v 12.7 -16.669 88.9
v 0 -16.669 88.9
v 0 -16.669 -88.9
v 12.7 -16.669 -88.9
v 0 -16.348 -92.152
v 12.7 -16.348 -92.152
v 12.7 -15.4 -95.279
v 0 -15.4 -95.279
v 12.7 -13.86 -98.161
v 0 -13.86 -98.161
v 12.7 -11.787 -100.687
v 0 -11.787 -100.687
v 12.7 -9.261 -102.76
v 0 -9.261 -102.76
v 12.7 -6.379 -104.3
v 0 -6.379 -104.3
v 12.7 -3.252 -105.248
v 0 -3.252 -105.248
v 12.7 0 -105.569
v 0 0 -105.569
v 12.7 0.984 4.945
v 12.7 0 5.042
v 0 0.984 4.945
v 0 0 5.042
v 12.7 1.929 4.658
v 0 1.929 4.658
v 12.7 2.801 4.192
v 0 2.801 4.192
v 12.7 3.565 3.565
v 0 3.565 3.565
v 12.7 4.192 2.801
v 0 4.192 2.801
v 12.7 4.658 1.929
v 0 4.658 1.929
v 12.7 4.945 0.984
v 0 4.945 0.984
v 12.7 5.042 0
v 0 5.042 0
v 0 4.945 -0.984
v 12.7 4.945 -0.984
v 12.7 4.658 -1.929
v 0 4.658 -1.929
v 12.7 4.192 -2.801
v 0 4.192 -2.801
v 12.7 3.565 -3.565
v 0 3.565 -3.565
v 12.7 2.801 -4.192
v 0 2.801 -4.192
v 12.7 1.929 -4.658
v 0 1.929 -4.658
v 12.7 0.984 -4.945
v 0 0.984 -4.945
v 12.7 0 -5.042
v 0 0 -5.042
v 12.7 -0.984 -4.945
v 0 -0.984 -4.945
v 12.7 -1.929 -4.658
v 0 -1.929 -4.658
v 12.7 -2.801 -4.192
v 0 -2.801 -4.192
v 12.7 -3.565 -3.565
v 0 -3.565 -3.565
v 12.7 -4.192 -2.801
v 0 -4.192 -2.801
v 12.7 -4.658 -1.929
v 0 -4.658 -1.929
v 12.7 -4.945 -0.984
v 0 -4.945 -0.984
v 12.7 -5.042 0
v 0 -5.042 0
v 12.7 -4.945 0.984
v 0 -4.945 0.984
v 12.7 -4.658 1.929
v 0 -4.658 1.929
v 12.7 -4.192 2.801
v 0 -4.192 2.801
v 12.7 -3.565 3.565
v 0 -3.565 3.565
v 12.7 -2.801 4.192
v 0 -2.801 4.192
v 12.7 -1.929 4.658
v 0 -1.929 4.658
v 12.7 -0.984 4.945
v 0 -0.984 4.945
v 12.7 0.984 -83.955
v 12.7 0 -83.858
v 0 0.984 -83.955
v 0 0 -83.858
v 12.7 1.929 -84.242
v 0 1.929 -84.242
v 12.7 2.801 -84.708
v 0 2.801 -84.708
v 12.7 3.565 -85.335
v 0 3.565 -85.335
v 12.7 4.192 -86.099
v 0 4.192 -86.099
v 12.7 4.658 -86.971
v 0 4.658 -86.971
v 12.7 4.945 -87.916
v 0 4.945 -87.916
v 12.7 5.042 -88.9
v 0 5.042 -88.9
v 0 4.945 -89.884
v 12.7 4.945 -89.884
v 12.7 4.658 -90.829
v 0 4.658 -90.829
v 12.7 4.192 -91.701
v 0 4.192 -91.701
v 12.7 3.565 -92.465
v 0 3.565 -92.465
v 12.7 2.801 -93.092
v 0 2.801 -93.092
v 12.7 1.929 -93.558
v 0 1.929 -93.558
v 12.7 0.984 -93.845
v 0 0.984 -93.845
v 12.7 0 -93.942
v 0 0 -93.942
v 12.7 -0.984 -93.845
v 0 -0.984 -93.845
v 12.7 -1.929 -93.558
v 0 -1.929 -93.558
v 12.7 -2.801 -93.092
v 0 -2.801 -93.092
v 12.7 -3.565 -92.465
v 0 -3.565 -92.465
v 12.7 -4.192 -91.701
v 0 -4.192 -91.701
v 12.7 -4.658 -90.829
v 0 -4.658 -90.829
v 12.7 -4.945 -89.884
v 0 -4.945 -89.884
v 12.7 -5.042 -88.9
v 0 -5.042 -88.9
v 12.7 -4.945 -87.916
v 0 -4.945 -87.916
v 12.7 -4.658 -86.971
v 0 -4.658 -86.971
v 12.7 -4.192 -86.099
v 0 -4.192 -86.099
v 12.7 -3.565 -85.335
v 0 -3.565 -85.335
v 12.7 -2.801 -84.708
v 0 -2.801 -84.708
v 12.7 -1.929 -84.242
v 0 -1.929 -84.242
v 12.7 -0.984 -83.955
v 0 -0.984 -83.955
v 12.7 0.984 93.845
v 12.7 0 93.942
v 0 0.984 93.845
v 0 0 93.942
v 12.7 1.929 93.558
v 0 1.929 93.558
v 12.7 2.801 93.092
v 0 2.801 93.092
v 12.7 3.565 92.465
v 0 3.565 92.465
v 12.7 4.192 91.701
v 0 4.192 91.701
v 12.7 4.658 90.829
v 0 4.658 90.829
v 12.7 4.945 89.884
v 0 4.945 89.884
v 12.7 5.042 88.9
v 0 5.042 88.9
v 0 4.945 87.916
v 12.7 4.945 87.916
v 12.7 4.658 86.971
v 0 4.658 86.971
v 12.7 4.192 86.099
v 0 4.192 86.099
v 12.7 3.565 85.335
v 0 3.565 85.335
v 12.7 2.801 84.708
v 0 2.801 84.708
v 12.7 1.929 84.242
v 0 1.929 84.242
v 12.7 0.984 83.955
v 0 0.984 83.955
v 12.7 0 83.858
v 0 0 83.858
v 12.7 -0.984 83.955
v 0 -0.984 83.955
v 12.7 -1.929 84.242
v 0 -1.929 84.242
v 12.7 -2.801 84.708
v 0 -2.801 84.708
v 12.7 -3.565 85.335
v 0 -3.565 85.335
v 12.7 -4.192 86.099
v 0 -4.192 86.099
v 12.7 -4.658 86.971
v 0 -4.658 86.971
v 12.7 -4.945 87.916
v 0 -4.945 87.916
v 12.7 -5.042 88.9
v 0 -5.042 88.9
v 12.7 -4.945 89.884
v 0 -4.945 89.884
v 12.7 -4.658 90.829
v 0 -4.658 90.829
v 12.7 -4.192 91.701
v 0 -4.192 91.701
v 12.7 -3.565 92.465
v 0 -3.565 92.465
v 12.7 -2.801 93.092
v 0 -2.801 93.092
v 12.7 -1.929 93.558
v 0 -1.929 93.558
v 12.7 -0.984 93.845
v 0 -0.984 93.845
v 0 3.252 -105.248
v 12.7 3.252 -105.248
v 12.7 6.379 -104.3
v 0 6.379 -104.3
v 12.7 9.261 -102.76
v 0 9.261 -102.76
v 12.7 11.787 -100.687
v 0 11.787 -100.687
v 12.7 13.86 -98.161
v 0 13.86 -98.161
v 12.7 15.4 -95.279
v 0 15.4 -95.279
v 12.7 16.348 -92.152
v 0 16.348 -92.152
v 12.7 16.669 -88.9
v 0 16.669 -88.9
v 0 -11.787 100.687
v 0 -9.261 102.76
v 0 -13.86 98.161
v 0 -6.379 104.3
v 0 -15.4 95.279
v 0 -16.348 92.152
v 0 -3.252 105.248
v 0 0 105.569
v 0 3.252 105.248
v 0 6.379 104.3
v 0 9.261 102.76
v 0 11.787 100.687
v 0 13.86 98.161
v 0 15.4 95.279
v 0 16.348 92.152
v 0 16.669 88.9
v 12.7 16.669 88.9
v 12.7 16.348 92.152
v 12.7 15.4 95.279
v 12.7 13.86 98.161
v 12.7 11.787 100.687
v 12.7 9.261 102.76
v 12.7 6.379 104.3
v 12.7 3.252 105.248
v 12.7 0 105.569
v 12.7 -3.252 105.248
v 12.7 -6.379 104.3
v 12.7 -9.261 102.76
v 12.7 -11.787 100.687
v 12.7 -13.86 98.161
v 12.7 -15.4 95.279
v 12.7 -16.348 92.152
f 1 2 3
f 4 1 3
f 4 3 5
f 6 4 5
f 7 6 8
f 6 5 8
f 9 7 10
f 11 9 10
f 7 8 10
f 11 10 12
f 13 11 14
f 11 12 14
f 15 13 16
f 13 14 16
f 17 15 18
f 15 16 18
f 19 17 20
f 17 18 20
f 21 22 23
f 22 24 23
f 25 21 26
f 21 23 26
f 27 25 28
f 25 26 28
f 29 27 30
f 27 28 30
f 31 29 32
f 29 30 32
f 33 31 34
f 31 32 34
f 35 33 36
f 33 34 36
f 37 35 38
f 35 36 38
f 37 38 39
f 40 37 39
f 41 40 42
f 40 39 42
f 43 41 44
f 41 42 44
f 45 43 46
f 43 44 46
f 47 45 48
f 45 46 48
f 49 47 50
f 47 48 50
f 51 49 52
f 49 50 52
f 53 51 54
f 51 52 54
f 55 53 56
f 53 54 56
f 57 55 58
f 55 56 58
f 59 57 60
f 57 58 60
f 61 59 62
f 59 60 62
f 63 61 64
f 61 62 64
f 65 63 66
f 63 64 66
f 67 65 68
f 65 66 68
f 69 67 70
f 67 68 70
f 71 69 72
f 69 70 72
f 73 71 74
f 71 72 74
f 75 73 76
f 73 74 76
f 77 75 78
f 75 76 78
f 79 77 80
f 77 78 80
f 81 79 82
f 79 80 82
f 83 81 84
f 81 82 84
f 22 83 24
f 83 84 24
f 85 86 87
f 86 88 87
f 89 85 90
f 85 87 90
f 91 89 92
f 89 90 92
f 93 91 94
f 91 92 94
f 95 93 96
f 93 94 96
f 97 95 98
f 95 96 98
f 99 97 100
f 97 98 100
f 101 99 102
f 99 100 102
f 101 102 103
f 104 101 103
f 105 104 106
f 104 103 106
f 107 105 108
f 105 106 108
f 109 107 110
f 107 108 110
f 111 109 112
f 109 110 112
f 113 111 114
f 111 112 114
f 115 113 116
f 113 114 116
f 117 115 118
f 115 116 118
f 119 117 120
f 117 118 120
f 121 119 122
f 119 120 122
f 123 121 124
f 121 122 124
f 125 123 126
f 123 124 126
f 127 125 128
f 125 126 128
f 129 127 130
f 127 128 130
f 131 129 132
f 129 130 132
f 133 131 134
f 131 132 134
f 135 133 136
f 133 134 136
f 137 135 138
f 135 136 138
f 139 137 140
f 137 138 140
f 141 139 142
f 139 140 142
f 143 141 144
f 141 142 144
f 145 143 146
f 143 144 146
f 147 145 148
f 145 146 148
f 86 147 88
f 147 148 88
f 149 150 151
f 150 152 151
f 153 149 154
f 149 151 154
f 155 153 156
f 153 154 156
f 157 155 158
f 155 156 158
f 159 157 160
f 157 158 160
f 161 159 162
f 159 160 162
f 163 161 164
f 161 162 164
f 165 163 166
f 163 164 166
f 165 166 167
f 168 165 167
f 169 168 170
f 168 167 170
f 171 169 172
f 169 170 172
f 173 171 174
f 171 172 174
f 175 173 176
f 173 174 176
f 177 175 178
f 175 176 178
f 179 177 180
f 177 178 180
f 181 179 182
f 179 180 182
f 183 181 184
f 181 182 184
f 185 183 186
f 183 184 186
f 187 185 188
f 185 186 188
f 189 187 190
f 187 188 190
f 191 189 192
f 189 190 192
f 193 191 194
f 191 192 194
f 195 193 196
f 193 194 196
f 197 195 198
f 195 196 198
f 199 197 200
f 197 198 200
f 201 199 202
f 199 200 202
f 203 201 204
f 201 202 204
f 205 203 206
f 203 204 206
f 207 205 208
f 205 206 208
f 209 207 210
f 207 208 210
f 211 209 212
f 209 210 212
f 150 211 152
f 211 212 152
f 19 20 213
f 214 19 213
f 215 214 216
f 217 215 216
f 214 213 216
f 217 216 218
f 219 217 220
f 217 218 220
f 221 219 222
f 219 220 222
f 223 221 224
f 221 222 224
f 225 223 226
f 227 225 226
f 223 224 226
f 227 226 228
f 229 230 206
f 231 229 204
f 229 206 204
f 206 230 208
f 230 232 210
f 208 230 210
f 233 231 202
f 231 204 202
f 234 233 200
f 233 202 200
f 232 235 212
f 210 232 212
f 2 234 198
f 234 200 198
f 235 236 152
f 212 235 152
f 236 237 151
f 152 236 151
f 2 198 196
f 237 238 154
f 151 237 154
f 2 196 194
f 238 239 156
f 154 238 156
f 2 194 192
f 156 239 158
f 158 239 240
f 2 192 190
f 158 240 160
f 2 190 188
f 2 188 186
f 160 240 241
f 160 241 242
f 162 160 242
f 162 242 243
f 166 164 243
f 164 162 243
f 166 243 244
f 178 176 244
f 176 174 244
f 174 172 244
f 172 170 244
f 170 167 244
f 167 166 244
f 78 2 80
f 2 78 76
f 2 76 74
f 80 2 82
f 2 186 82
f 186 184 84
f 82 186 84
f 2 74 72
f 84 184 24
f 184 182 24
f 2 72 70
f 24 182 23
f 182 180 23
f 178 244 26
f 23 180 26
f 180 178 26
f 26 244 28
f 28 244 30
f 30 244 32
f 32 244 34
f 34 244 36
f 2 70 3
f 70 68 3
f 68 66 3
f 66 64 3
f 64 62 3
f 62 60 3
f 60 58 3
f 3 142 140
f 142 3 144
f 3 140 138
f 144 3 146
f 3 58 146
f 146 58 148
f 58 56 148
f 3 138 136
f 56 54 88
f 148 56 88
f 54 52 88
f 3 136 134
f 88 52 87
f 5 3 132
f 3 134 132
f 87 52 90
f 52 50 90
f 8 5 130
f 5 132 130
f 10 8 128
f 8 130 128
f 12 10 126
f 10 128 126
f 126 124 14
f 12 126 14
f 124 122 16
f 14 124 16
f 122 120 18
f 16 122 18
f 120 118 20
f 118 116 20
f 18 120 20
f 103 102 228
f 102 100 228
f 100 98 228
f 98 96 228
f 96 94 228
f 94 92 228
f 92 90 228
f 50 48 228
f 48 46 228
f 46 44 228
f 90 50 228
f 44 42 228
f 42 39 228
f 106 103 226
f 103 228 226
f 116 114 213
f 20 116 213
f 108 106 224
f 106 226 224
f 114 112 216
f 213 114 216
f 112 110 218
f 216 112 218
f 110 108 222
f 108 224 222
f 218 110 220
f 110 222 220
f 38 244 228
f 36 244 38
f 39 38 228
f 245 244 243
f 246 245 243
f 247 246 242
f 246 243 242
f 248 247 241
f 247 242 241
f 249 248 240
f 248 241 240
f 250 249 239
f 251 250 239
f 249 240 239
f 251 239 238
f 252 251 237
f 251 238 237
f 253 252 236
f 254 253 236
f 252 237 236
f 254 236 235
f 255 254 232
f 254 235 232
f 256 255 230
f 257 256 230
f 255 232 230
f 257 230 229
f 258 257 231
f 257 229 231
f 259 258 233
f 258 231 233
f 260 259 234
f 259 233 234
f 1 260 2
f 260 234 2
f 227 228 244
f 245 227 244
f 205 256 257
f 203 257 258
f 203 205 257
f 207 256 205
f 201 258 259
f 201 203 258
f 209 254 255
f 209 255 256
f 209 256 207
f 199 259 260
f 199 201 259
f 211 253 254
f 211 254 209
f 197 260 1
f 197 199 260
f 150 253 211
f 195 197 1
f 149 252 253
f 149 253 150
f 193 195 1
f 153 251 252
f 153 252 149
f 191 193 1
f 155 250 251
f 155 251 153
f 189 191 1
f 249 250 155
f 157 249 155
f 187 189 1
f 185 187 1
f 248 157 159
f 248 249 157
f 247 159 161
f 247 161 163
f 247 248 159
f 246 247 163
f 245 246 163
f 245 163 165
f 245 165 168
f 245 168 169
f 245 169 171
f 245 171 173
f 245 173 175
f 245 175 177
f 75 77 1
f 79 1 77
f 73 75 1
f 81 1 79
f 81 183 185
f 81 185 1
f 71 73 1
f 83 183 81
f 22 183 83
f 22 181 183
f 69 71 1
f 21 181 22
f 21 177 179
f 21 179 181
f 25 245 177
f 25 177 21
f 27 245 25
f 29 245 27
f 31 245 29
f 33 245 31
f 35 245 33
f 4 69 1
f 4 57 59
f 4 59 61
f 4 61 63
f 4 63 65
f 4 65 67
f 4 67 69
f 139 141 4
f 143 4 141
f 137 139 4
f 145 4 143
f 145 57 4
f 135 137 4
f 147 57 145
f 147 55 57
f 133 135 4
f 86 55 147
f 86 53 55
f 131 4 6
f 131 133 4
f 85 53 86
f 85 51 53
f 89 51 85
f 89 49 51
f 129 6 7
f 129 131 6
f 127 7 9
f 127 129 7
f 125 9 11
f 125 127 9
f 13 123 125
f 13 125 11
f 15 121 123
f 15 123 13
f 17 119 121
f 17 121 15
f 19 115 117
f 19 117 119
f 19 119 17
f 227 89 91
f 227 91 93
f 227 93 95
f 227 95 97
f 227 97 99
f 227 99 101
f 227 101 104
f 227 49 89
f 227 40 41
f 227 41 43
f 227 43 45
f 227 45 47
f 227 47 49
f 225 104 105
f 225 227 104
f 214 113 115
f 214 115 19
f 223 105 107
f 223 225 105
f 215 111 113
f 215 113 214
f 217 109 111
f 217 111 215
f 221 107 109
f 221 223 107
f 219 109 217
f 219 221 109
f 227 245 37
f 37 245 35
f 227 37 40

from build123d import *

# Parameters (mm, degrees)
SKETCH1_R                   = 16.66875
BOSS_EXTRUDE1_DEPTH         = 12.7
F_3_8_CLEARANCE_HOLE1_D     = 10.0838
F_3_8_CLEARANCE_HOLE1_DEPTH = 12.7
F_3_8_CLEARANCE_HOLE1_TIP   = 3.029479155


with BuildPart() as part:
    # Sketch1 → Boss-Extrude1 (new body)
    with BuildSketch(Plane(origin=(0, 0, 0), x_dir=(0, 0, -1), z_dir=(1, 0, 0))):
        with Locations((-88.9, 0)):
            Circle(SKETCH1_R)
        with BuildLine():
            Line((88.9, 16.66875), (-88.9, 16.66875))
            ThreePointArc((-88.9, 16.66875), (-77.113413841, 11.786586159), (-72.23125, 0))
            ThreePointArc((-72.23125, 0), (-77.113413841, -11.786586159), (-88.9, -16.66875))
            Line((-88.9, -16.66875), (88.9, -16.66875))
            ThreePointArc((88.9, -16.66875), (72.23125, 0), (88.9, 16.66875))
        make_face()
        with BuildLine():
            ThreePointArc((105.56875, 0), (100.686586159, 11.786586159), (88.9, 16.66875))
            Line((88.9, 16.66875), (88.9, -16.66875))
            ThreePointArc((88.9, -16.66875), (100.686586159, -11.786586159), (105.56875, 0))
        make_face()
        with BuildLine():
            Line((88.9, -16.66875), (88.9, 16.66875))
            ThreePointArc((88.9, 16.66875), (72.23125, 0), (88.9, -16.66875))
        make_face()
    extrude(amount=BOSS_EXTRUDE1_DEPTH)

    # 3/8 Clearance Hole1
    with Locations(Plane(origin=(12.7, 0, 0), x_dir=(0, 0, -1), z_dir=(1, 0, 0))):
        with Locations((0, 0), (88.9, 0), (-88.9, 0)):
            Hole(F_3_8_CLEARANCE_HOLE1_D / 2, depth=F_3_8_CLEARANCE_HOLE1_DEPTH)
            with Locations((0, 0, -(F_3_8_CLEARANCE_HOLE1_DEPTH + F_3_8_CLEARANCE_HOLE1_TIP / 2))):  # 118° drill point
                Cone(0, F_3_8_CLEARANCE_HOLE1_D / 2, F_3_8_CLEARANCE_HOLE1_TIP, mode=Mode.SUBTRACT)


solid = part.part
